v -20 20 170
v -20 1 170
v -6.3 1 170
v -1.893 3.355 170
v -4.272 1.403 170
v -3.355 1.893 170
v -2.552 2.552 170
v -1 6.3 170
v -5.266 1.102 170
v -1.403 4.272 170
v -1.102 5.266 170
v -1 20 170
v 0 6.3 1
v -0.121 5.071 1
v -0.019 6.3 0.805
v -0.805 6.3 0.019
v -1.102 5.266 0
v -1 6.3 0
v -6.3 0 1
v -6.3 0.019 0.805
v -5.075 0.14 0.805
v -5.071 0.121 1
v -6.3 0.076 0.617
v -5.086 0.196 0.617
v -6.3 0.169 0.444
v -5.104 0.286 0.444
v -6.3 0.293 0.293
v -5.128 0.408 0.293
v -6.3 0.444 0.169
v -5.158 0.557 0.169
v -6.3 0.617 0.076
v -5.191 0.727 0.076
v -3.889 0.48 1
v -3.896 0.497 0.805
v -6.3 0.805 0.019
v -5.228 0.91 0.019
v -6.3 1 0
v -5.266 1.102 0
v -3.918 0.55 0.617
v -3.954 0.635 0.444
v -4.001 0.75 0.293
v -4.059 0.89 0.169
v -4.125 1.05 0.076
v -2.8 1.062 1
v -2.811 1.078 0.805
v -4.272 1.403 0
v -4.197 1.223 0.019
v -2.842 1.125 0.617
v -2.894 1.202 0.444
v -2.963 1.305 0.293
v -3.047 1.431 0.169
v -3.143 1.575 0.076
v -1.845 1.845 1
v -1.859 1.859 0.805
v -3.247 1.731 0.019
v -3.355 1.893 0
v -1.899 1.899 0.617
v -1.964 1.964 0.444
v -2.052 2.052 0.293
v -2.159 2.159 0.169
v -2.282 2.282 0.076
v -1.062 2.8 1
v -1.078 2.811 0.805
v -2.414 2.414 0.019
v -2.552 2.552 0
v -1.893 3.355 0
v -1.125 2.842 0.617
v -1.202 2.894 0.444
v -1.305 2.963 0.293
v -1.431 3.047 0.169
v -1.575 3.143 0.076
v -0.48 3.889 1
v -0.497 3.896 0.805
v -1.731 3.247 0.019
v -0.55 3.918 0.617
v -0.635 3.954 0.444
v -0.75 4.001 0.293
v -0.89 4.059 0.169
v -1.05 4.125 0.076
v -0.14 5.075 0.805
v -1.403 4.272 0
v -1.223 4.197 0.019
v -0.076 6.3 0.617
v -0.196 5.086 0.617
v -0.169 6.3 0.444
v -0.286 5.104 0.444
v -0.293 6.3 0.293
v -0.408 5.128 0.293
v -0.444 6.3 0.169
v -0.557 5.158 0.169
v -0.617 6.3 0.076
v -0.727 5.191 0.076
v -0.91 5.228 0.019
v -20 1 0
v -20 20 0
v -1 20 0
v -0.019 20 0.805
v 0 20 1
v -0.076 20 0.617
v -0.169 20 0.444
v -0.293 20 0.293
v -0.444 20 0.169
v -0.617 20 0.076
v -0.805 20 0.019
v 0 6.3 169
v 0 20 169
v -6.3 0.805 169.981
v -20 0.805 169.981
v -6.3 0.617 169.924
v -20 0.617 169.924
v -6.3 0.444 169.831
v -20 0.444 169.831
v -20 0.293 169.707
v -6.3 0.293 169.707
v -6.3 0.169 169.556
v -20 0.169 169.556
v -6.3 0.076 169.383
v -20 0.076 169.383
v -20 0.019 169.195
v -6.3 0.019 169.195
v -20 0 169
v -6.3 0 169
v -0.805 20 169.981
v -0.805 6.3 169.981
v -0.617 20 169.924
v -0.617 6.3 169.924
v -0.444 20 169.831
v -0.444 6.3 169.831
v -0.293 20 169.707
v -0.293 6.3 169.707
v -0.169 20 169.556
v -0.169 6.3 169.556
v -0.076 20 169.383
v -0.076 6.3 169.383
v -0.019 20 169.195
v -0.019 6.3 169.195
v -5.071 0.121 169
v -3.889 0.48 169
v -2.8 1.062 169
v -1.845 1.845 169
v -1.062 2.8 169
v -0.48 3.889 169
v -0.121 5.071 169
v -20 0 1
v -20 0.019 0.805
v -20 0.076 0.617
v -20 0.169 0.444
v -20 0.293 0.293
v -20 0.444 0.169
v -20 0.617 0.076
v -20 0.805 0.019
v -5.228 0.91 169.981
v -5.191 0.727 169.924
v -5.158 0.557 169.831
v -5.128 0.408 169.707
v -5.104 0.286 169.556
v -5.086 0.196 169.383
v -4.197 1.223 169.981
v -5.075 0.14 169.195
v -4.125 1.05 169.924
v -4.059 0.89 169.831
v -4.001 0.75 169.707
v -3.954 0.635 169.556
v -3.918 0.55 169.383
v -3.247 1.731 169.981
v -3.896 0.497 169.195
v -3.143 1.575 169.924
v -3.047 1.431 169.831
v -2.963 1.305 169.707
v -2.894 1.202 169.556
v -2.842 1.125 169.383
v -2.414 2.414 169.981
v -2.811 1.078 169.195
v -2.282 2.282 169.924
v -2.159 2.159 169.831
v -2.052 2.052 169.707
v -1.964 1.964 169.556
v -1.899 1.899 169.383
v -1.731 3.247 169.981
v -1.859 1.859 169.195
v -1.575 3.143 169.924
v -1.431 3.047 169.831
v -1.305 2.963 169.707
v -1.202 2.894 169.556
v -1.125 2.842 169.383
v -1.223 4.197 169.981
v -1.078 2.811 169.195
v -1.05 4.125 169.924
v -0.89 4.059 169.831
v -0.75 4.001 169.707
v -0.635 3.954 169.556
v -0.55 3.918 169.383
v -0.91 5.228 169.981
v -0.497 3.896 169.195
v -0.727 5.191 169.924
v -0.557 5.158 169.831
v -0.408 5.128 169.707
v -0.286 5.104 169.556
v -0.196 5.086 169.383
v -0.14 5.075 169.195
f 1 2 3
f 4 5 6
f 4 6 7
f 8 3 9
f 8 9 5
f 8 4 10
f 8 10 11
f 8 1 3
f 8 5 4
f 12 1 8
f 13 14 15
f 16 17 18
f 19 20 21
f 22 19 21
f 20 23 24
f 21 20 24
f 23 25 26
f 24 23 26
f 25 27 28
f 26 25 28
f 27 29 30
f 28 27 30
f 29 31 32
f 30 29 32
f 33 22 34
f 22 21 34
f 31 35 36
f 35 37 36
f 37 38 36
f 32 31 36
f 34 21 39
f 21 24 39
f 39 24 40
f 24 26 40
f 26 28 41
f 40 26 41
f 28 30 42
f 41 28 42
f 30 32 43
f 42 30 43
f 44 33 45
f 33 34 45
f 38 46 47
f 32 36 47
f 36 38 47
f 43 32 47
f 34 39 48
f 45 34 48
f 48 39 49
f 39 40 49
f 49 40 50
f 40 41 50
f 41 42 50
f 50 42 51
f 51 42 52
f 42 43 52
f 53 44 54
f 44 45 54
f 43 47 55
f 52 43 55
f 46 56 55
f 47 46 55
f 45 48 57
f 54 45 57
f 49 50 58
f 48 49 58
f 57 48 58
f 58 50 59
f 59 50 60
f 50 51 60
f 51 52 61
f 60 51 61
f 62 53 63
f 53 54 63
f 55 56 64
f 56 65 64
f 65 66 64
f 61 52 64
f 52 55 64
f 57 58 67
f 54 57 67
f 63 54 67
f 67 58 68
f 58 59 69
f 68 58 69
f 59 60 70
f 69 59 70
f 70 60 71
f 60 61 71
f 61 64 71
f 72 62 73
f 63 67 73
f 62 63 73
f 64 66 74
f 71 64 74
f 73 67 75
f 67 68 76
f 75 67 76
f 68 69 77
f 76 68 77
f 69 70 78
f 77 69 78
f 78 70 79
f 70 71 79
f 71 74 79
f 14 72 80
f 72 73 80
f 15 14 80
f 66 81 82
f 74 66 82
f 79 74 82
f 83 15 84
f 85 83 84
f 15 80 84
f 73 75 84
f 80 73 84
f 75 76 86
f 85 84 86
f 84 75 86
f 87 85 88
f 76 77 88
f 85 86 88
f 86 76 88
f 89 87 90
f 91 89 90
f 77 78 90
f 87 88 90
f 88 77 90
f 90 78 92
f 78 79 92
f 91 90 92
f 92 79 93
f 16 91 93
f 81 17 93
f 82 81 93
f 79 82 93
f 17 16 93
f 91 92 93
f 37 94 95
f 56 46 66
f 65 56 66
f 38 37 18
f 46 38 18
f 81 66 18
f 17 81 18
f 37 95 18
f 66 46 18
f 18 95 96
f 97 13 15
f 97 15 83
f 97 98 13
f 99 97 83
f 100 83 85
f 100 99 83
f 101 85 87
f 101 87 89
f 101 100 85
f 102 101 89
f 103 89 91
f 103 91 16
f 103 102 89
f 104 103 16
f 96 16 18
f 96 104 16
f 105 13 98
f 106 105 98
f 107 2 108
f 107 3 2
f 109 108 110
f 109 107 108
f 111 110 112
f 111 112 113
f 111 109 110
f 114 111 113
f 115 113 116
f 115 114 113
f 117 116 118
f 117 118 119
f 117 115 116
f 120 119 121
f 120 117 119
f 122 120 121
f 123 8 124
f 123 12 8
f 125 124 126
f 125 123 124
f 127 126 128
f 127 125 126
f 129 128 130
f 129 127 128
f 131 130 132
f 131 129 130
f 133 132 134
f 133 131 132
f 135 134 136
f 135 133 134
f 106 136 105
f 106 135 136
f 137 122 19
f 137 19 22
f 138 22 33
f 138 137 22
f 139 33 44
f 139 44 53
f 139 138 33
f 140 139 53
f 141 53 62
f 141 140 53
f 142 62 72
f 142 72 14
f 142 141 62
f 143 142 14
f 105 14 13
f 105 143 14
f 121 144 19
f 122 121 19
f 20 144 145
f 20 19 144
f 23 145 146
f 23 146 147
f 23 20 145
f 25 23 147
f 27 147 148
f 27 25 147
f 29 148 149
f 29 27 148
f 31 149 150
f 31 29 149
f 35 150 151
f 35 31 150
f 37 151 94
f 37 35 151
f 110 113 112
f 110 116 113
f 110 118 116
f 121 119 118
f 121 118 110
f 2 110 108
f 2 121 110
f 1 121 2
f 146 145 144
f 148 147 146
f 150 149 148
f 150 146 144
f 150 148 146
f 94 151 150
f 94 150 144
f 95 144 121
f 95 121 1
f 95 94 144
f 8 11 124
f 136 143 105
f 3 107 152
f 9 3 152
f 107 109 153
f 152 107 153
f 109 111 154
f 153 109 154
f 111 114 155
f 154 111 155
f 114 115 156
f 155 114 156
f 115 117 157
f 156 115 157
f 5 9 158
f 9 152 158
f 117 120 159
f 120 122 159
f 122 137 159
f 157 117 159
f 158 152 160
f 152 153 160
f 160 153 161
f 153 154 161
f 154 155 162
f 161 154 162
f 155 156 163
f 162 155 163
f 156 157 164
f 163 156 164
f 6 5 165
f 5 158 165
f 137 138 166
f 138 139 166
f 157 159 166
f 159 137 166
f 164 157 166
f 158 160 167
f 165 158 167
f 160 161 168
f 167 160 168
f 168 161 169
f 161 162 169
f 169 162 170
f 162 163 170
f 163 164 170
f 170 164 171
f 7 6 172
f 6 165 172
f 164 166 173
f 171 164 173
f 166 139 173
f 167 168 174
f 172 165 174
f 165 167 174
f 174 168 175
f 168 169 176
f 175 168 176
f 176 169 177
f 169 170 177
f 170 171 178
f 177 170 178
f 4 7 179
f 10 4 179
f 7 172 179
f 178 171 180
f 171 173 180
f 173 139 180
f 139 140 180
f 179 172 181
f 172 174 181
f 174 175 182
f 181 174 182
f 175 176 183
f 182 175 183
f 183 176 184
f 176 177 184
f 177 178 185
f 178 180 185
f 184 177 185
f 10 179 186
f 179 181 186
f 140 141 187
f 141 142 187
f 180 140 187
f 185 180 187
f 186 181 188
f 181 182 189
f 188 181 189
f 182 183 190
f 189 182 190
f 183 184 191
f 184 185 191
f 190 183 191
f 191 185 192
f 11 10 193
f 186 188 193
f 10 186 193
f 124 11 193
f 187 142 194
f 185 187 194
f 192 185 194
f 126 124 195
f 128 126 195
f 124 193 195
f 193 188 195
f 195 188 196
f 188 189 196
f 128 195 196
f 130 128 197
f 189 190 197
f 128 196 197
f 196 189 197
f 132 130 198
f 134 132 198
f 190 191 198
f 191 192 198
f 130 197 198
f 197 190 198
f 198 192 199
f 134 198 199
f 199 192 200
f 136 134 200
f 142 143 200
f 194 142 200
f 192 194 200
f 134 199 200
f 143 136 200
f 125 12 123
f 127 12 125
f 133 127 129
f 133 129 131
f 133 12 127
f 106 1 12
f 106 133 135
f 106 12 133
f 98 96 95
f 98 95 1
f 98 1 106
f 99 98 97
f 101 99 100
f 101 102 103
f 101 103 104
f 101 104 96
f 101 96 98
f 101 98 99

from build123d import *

# Parameters (mm, degrees)
SKETCH_W    = 20
SKETCH_H    = 20
PAD_DEPTH   = 170
FILLET_R    = 6.3
FILLET001_R = 1
FILLET002_R = 1


with BuildPart() as part:
    # Sketch → Pad (new body)
    with BuildSketch(Plane.XY):
        with Locations((-10, 10)):
            Rectangle(SKETCH_W, SKETCH_H)
    extrude(amount=PAD_DEPTH)

    # Fillet
    fillet_edges = [part.edges().sort_by_distance(p)[0] for p in [
        (0, 0, 85),
    ]]
    fillet(fillet_edges, radius=FILLET_R)

    # Fillet001
    fillet001_edges = [part.edges().sort_by_distance(p)[0] for p in [
        (0, 13.15, 170),
    ]]
    fillet(fillet001_edges, radius=FILLET001_R)

    # Fillet002
    fillet002_edges = [part.edges().sort_by_distance(p)[0] for p in [
        (-1.845227, 1.845227, 0),
    ]]
    fillet(fillet002_edges, radius=FILLET002_R)


solid = part.part
